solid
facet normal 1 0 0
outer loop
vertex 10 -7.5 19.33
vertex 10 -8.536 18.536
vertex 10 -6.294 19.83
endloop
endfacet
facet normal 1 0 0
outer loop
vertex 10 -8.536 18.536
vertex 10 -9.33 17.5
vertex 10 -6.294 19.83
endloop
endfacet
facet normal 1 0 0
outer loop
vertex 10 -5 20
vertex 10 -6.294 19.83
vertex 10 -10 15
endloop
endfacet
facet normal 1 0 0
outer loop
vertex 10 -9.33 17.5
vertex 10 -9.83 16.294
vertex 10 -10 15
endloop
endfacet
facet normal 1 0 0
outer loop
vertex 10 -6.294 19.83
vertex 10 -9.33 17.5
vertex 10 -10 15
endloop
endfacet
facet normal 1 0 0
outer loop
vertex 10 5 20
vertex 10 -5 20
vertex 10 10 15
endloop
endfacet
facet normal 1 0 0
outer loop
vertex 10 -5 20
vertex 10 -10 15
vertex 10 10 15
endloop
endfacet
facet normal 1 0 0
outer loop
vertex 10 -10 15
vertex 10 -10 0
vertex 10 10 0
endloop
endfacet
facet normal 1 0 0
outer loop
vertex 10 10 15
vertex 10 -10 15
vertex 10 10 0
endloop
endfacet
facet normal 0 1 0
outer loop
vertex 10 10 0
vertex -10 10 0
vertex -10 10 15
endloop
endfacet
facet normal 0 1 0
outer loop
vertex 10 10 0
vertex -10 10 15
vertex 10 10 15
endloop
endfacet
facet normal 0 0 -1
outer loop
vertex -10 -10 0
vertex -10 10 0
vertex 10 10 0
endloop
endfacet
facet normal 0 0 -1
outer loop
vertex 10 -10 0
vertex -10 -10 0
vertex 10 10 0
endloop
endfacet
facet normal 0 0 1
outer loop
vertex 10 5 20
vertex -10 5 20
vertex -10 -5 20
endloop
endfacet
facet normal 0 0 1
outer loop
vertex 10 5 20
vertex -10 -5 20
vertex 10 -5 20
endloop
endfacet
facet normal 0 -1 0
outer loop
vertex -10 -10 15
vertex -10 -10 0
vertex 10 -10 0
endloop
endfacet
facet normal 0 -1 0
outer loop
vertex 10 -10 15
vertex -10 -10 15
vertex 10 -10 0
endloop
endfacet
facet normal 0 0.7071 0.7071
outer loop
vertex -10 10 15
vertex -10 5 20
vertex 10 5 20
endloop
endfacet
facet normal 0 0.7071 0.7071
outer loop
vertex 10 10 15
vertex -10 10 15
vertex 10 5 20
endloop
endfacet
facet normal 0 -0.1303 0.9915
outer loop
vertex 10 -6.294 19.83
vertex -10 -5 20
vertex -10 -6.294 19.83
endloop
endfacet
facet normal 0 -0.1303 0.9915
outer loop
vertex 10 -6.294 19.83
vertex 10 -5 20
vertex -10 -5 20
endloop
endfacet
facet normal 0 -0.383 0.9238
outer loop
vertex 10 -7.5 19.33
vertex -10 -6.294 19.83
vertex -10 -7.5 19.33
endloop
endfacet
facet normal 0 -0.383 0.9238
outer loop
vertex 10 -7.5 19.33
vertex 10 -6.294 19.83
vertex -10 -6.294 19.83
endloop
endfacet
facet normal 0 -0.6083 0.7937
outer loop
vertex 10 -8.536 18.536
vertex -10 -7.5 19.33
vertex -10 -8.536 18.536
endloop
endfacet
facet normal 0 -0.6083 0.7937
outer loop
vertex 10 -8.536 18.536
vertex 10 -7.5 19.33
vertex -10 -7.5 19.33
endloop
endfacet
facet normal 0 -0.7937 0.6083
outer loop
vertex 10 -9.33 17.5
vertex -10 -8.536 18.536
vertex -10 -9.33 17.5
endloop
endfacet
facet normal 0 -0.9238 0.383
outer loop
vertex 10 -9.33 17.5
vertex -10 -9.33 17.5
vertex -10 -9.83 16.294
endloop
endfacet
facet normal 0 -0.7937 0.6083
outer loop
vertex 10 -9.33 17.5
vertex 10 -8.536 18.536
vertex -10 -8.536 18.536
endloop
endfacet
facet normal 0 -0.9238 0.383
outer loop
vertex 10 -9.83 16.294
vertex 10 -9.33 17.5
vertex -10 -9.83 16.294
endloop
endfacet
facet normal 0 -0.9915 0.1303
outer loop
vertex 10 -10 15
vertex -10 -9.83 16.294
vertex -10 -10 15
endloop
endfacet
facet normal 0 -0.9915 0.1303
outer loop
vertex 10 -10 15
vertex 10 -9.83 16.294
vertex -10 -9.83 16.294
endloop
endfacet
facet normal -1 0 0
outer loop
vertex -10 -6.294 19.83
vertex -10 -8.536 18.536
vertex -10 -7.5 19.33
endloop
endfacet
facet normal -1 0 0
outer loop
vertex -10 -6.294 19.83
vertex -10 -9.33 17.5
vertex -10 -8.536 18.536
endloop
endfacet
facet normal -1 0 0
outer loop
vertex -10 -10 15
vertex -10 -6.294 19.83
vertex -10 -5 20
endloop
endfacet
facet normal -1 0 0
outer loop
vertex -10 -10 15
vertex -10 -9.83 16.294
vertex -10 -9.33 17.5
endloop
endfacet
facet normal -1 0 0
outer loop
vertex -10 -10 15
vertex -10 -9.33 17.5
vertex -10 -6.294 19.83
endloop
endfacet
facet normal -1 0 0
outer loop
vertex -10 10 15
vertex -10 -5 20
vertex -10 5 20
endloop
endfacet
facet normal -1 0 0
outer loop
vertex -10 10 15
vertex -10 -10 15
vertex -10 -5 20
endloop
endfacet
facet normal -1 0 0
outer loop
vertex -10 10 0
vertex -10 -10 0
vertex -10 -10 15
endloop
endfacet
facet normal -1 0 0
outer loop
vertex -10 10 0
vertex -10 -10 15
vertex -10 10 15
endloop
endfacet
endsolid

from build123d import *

# Parameters (mm, degrees)
F0_W     = 20
F0_H     = 20
F1_DEPTH = 20
F2_SIZE  = 5
F3_R     = 5


with BuildPart() as f1:
    # F0 (on Top) → F1 (new body)
    with BuildSketch(Plane.XY):
        Rectangle(F0_W, F0_H)
    extrude(amount=F1_DEPTH)

    # F2
    f2_edges = [f1.edges().sort_by_distance(p)[0] for p in [
        (0, 10, 20),
    ]]
    chamfer(f2_edges, length=F2_SIZE)

    # F3
    f3_edges = [f1.edges().sort_by_distance(p)[0] for p in [
        (0, -10, 20),
    ]]
    fillet(f3_edges, radius=F3_R)


solid = f1.part
